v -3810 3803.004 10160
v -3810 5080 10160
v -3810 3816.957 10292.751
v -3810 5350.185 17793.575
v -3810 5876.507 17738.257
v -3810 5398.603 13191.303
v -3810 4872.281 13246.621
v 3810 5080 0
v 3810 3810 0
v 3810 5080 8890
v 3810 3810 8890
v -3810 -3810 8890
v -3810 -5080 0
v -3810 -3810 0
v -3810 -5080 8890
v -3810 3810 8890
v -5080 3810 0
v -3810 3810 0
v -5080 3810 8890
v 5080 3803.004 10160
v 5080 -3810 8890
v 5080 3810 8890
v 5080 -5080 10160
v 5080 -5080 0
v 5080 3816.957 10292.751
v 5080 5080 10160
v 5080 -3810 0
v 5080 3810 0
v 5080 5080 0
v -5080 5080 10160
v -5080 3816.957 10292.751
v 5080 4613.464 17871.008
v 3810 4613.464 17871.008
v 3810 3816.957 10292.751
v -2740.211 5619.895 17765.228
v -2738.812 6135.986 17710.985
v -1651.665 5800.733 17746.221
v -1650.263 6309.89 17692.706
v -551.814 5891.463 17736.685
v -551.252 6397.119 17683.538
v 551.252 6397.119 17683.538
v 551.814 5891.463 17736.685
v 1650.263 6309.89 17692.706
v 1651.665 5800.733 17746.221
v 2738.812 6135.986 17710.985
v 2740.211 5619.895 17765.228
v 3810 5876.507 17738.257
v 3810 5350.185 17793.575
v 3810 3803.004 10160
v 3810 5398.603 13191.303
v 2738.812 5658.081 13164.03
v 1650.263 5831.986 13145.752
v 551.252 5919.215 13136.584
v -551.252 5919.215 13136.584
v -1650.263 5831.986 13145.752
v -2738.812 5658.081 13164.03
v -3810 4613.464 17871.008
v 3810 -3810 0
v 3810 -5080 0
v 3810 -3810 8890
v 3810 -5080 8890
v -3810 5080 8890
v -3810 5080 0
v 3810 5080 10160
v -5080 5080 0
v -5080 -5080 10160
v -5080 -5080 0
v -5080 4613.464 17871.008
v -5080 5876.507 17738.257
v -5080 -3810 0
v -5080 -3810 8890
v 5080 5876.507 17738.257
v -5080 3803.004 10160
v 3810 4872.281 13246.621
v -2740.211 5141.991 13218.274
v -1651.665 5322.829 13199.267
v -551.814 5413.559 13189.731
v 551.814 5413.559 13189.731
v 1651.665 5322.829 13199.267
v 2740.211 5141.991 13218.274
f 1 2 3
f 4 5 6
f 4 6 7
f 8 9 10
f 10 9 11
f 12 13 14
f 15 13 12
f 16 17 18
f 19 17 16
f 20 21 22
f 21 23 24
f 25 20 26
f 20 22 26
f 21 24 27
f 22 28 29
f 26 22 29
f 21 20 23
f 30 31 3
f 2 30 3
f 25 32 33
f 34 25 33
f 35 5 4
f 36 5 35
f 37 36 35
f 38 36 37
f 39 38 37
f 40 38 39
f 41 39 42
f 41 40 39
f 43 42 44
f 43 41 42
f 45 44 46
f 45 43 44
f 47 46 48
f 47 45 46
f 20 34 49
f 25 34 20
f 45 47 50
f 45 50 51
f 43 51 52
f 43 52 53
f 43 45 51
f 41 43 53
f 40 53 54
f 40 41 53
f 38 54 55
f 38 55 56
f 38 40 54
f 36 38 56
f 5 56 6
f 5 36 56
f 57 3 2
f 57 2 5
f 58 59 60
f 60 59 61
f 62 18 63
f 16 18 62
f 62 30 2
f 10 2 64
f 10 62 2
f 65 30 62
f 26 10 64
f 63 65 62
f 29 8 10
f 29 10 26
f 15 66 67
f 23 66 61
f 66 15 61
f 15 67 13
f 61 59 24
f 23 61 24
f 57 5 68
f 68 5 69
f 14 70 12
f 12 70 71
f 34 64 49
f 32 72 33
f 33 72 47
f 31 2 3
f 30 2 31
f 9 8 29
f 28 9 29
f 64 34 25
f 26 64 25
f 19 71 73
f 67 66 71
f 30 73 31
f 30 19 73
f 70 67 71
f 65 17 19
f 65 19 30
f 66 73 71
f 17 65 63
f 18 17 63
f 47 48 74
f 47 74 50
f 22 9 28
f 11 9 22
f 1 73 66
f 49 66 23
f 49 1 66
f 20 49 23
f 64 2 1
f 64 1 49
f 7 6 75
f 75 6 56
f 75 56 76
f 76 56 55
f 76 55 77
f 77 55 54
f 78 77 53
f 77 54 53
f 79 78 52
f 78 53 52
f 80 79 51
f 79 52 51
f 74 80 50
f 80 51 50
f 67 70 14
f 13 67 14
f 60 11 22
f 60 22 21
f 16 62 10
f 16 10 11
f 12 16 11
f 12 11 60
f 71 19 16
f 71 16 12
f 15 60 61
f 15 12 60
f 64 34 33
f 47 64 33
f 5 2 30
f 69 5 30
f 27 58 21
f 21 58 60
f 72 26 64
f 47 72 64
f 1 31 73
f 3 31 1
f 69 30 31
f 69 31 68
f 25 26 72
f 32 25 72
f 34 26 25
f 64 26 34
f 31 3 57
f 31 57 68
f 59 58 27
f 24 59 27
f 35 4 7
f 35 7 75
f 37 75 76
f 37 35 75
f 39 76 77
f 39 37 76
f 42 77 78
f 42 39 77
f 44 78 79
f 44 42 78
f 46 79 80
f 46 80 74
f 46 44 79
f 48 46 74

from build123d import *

# Parameters (mm, degrees)
F0_W      = 10160
F0_H      = 10160
F1_DEPTH  = 10160
F2_W      = 7620
F2_H      = 8890
F3_DEPTH  = 12979.4
F4_W      = 7620
F4_H      = 8890
F5_DEPTH  = 15138.4
F10_W     = 10160
F10_H     = 7620
F11_DEPTH = 1270
F12_W     = 7620
F12_H     = 7620
F13_DEPTH = 5130.8
F15_W     = 1270
F15_H     = 1270
F16_DEPTH = 170.18
F14_W     = 1270
F14_H     = 1270
F17_DEPTH = 208.28
F19_DEPTH = 4572


with BuildPart() as f1:
    # F0 (on Top) → F1 (new body)
    with BuildSketch(Plane.XY):
        Rectangle(F0_W, F0_H)
    extrude(amount=F1_DEPTH)

    # F2 (on face) → F3 (cut)
    with BuildSketch(Plane.XZ.offset(5080)):
        with Locations((0, 4445)):
            Rectangle(F2_W, F2_H)
    extrude(amount=-F3_DEPTH, mode=Mode.SUBTRACT)

    # F4 (on face) → F5 (cut)
    with BuildSketch(Plane(origin=(-5080, 0, 0), x_dir=(0, -1, 0), z_dir=(-1, 0, 0))):
        with Locations((0, 4445)):
            Rectangle(F4_W, F4_H)
    extrude(amount=-F5_DEPTH, mode=Mode.SUBTRACT)

    # F15 (on face) → F16 (join)
    with BuildSketch(Plane(origin=(0, 1111.6964834904, 10577.0855064048), x_dir=(1, 0, 0), z_dir=(0, -0.1045284633, -0.9945218954))):
        with Locations((4445, -3355.1620416715)):
            Rectangle(F15_W, F15_H)
    extrude(amount=F16_DEPTH)

    # F14 (on face) → F17 (join)
    with BuildSketch(Plane(origin=(0, 1111.6964834904, 10577.0855064048), x_dir=(1, 0, 0), z_dir=(0, -0.1045284633, -0.9945218954))):
        with Locations((-4445, -3355.1620416715)):
            Rectangle(F14_W, F14_H)
    extrude(amount=F17_DEPTH)


with BuildPart() as f11:
    # F10 (on face) → F11 (new body)
    with BuildSketch(Plane(origin=(0, 3968.3035165096, -417.0855064048), x_dir=(-1, 0, 0), z_dir=(0, 0.9945218954, -0.1045284633))):
        with Locations((0, 14445.3470503413)):
            Rectangle(F10_W, F10_H)
    extrude(amount=-F11_DEPTH)

    # F12 (on face) → F13 (cut)
    with BuildSketch(Plane(origin=(0, 2705.2607093919, -284.3343580549), x_dir=(1, 0, 0), z_dir=(0, -0.9945218954, 0.1045284633))):
        with Locations((0, 14445.3470503413)):
            Rectangle(F12_W, F12_H)
    extrude(amount=-F13_DEPTH, mode=Mode.SUBTRACT)


with BuildPart() as f19:
    # F18 (on face) → F19 (new body)
    with BuildSketch(Plane(origin=(0, 1908.2033735899, 18155.3423491111), x_dir=(1, 0, 0), z_dir=(0, 0.1045284633, 0.9945218954))):
        with BuildLine():
            Line((3810, 3460.9414873997), (3810, 3990.1620416715))
            ThreePointArc((3810, 3990.1620416715), (0, 4524.6190016034), (-3810, 3990.1620416715))
            Line((-3810, 3990.1620416715), (-3810, 3460.9414873997))
            ThreePointArc((-3810, 3460.9414873997), (0, 4016.6190016034), (3810, 3460.9414873997))
        make_face()
    extrude(amount=-F19_DEPTH)


solid = Compound([f1.part, f11.part, f19.part])
